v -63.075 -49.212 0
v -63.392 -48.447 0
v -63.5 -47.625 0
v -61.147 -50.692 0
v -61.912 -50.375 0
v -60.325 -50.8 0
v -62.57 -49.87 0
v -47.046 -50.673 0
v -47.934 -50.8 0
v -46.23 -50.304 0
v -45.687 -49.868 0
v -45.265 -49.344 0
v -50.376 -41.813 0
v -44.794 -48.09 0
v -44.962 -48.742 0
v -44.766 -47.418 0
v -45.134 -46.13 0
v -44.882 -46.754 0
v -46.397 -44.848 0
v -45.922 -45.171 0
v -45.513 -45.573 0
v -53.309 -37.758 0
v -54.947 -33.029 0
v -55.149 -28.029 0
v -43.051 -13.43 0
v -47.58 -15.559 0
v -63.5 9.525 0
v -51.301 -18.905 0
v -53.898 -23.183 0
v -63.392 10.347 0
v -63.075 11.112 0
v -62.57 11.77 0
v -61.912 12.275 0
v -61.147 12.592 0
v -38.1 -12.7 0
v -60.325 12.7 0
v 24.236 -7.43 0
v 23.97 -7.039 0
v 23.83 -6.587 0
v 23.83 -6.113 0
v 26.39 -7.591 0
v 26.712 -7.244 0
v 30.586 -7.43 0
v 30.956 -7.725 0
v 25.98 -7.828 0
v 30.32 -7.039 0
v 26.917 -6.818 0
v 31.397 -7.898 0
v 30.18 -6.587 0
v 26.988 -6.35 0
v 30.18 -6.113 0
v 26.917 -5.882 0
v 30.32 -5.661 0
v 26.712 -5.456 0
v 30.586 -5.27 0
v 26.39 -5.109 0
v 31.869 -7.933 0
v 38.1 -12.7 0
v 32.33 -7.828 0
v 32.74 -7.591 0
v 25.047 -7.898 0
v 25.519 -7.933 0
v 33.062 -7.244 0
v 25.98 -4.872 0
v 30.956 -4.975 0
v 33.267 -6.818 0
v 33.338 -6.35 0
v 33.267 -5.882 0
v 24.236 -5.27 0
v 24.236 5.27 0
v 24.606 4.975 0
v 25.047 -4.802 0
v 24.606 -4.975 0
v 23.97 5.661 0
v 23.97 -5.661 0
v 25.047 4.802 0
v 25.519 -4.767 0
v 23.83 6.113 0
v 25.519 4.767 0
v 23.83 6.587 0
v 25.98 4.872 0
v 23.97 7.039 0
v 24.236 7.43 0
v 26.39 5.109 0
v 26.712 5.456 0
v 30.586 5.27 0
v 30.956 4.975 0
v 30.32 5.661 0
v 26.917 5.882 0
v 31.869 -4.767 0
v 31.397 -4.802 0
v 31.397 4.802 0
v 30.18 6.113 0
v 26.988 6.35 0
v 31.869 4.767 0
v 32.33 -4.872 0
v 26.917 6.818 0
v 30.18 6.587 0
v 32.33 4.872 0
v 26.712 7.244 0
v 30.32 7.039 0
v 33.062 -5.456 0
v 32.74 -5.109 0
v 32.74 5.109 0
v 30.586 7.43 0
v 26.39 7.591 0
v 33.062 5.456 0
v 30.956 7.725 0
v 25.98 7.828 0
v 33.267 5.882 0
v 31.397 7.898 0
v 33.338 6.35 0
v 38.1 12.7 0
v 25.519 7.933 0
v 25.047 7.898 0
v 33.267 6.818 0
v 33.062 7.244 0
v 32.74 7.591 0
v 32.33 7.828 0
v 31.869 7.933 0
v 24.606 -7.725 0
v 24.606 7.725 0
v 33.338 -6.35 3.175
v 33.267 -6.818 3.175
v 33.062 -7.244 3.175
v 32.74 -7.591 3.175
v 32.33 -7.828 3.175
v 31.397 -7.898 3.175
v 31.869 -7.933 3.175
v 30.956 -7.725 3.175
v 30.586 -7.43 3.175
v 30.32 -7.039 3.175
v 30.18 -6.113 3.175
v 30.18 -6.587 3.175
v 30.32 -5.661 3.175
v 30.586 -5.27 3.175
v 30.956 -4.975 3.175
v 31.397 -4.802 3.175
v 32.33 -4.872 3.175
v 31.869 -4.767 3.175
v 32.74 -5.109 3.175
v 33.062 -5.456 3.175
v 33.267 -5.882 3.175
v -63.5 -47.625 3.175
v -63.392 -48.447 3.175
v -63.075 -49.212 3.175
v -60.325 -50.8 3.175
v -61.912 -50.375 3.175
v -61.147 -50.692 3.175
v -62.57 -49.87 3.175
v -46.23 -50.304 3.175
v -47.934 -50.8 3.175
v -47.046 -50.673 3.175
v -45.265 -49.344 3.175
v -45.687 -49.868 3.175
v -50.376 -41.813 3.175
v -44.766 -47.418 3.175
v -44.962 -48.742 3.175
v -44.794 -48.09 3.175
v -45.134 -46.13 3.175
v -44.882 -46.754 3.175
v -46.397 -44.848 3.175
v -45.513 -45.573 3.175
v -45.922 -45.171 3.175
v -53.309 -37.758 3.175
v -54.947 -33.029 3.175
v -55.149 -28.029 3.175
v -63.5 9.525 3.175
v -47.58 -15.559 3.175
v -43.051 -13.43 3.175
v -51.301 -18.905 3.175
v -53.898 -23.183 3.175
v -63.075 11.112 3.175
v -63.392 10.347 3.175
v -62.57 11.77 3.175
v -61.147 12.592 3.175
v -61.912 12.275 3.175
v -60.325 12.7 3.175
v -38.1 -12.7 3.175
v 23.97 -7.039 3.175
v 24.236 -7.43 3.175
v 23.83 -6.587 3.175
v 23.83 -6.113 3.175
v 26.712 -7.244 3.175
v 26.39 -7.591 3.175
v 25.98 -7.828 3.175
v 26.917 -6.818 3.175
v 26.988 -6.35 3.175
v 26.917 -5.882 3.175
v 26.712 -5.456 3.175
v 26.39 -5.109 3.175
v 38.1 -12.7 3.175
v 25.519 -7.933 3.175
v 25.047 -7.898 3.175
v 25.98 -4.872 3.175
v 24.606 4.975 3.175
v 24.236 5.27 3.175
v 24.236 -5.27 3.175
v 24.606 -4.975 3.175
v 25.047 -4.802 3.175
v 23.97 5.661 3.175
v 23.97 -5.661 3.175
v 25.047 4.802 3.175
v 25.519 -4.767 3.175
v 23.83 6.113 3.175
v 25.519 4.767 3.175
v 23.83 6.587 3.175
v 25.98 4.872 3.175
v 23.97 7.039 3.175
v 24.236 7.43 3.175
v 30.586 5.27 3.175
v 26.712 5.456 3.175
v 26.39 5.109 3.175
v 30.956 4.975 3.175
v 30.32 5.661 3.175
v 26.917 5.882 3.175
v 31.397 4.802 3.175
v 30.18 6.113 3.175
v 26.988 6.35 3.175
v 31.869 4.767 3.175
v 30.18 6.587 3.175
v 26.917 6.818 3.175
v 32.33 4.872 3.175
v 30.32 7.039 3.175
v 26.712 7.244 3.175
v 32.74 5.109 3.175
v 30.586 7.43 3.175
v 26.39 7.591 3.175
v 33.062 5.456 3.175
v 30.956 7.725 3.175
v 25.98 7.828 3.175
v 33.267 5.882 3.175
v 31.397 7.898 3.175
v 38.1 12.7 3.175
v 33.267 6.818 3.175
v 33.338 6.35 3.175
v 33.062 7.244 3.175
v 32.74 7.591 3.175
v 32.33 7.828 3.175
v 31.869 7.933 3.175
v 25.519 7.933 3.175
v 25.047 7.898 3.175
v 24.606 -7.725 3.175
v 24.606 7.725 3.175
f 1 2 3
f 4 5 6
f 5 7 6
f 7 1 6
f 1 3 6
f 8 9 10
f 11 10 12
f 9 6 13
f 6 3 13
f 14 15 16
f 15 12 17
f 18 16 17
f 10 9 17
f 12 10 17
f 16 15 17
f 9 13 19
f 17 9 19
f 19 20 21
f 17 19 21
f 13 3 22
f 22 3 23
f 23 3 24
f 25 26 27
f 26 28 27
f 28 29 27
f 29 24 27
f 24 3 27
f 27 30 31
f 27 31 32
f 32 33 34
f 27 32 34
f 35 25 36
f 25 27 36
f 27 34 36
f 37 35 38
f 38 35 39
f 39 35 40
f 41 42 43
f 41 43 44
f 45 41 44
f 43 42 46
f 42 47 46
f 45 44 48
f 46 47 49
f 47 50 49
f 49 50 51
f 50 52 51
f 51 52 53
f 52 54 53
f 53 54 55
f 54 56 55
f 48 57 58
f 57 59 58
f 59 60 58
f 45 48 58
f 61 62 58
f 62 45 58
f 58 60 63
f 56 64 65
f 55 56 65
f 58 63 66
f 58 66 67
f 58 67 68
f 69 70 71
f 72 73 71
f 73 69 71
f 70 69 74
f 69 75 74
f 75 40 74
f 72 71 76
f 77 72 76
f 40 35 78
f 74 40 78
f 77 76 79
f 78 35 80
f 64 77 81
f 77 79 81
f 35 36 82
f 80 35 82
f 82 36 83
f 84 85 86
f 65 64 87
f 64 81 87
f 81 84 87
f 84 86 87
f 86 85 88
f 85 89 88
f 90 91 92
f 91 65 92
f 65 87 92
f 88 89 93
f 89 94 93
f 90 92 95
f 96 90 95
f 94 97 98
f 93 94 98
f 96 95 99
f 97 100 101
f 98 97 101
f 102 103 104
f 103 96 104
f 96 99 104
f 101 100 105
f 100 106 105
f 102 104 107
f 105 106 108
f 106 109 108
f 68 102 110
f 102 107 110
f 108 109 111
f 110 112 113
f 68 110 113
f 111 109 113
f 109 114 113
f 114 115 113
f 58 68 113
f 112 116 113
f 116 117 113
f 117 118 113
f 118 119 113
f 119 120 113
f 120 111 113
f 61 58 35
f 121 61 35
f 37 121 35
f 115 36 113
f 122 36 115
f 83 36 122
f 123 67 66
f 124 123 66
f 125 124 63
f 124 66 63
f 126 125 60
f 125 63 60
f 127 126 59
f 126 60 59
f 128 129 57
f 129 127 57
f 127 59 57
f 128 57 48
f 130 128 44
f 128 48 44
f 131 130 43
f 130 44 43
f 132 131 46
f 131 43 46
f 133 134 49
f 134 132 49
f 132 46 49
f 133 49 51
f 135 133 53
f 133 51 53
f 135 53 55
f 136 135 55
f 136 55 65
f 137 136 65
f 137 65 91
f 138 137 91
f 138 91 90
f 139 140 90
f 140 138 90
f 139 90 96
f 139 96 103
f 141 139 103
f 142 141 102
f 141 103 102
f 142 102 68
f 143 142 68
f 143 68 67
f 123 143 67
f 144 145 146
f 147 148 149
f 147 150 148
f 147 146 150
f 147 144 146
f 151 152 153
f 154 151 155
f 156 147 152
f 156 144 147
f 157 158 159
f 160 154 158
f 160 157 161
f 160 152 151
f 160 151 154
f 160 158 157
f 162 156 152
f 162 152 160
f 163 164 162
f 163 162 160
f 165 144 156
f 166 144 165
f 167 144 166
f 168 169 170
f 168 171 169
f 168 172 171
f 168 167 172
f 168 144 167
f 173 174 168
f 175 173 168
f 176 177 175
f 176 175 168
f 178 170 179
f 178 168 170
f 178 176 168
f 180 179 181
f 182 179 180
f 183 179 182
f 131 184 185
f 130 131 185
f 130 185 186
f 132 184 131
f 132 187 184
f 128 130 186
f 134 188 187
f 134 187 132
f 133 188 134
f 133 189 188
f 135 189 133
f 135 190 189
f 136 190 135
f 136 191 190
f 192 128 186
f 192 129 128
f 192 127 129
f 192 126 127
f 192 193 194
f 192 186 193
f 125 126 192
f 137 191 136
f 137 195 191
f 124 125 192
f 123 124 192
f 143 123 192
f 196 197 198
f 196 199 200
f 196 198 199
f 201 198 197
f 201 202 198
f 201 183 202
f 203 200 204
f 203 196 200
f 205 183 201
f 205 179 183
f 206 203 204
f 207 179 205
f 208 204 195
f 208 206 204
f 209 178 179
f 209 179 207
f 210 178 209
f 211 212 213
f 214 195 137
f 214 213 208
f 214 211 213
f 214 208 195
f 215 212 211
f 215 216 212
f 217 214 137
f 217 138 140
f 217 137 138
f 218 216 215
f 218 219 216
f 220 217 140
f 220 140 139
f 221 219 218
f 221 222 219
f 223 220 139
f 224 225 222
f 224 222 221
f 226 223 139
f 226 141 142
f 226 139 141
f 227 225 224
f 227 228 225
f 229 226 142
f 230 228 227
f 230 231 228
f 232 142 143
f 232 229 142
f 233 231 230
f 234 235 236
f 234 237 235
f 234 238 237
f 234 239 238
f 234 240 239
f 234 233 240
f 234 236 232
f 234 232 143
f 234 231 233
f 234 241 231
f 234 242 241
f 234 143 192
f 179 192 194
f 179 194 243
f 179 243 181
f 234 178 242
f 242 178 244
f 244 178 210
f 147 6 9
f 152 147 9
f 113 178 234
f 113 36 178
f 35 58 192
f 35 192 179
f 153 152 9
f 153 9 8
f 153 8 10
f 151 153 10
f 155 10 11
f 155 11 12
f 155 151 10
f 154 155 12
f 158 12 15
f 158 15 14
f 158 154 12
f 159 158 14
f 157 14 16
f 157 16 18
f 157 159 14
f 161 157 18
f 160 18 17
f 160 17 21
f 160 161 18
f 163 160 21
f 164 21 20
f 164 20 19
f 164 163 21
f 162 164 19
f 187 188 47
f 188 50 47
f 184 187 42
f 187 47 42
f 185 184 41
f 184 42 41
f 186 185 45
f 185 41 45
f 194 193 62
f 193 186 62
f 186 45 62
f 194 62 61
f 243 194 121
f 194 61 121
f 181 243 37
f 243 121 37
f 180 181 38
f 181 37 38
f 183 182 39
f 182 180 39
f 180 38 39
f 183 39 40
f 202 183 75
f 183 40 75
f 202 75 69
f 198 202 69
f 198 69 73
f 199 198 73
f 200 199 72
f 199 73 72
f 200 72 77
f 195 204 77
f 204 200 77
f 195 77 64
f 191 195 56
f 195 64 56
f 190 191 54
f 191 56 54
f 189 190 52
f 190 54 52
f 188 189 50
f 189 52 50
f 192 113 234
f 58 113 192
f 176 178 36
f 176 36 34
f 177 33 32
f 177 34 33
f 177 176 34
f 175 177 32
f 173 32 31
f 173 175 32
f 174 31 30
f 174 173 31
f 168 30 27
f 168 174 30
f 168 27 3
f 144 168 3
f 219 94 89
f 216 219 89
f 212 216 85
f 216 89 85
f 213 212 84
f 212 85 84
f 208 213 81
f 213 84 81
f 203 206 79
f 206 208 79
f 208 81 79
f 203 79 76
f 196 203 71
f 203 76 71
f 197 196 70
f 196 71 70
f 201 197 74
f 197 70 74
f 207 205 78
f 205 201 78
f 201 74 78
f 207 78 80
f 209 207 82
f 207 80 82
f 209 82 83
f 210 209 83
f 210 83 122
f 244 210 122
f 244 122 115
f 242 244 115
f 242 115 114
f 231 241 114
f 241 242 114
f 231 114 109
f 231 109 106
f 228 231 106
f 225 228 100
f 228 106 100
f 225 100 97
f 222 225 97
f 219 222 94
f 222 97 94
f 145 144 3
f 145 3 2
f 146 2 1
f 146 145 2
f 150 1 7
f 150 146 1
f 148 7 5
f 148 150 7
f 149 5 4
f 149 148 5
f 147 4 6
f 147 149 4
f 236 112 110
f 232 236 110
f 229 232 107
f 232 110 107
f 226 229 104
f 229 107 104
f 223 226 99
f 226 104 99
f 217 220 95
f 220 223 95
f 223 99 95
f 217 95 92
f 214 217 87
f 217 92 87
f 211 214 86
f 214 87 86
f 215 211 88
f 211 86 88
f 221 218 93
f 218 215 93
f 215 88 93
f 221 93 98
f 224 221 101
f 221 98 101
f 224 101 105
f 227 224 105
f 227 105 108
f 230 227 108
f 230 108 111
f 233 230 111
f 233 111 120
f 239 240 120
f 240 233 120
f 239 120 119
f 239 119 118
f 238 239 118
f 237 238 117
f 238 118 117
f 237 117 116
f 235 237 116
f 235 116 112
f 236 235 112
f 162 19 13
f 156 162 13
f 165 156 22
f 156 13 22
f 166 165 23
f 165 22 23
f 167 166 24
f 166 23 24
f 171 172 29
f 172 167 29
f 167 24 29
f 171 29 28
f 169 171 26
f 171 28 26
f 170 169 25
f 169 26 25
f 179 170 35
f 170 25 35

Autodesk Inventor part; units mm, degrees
ref_plane "YZ Plane" through (0, 0, 0) normal (1, 0, 0) x (0, 1, 0)
ref_plane "XZ Plane" through (0, 0, 0) normal (0, 1, 0) x (-1, 0, 0)
ref_plane "XY Plane" through (0, 0, 0) normal (0, 0, 1) x (1, 0, 0)
sketch "Sketch1" plane through (0, 0, 0) normal (0, 0, 1) x (1, 0, 0)
  line L0 (38.1, -12.7) -> (-38.1, -12.7)
  line L1 (-38.1, -12.7) -> (-38.1, 12.7)
  line L2 (-38.1, 12.7) -> (38.1, 12.7)
  line L3 (38.1, 12.7) -> (38.1, -12.7)
  line L4 (38.1, -12.7) -> (-38.1, 12.7) construction
  line L5 (-38.1, -12.7) -> (38.1, 12.7) construction
  circle A0 centre (31.75, 6.35) radius 1.5875
  circle A1 centre (31.75, -6.35) radius 1.5875
  circle A2 centre (25.4, 6.35) radius 1.5875
  circle A3 centre (25.4, -6.35) radius 1.5875
  line L6 (-38.1, 12.7) -> (-63.5, 12.7)
  line L7 (-63.5, 12.7) -> (-63.5, -50.8)
  line L8 (-63.5, -50.8) -> (-38.1, -50.8)
  line L9 (-38.1, -50.8) -> (-38.1, 12.7)
  circle A4 centre (-38.1, -29.845) radius 17.145
  point P0 (0, 0)
  point P1 (-38.1, -46.99)
  dimension "d0" = 76.2
  dimension "d1" = 25.4
  dimension "d2" = 3.175
  dimension "d3" = 6.35
  dimension "d4" = 6.35
  dimension "d5" = 3.175
  dimension "d6" = 6.35
  dimension "d7" = 6.35
  dimension "d8" = 3.175
  dimension "d9" = 6.35
  dimension "d10" = 6.35
  dimension "d13" = 3.175
  dimension "d14" = 6.35
  dimension "d15" = 6.35
  dimension "d16" = 25.4
  dimension "d17" = 63.5
  dimension "d18" = 34.29
  dimension "d19" = 17.145
extrude "Extrusion1" add sketch "Sketch1" along normal blind 3.175 contours L0 L1 L2 L3 | A4 L9 L8 L7 L6 L1
fillet "Fillet1" radius 3.175 4 edges at (-38.1, -50.8, 1.5875) (-38.1, -46.99, 1.5875) (-63.5, -50.8, 1.5875) (-63.5, 12.7, 1.5875)
properties part number "Climb_Hooks_2"
